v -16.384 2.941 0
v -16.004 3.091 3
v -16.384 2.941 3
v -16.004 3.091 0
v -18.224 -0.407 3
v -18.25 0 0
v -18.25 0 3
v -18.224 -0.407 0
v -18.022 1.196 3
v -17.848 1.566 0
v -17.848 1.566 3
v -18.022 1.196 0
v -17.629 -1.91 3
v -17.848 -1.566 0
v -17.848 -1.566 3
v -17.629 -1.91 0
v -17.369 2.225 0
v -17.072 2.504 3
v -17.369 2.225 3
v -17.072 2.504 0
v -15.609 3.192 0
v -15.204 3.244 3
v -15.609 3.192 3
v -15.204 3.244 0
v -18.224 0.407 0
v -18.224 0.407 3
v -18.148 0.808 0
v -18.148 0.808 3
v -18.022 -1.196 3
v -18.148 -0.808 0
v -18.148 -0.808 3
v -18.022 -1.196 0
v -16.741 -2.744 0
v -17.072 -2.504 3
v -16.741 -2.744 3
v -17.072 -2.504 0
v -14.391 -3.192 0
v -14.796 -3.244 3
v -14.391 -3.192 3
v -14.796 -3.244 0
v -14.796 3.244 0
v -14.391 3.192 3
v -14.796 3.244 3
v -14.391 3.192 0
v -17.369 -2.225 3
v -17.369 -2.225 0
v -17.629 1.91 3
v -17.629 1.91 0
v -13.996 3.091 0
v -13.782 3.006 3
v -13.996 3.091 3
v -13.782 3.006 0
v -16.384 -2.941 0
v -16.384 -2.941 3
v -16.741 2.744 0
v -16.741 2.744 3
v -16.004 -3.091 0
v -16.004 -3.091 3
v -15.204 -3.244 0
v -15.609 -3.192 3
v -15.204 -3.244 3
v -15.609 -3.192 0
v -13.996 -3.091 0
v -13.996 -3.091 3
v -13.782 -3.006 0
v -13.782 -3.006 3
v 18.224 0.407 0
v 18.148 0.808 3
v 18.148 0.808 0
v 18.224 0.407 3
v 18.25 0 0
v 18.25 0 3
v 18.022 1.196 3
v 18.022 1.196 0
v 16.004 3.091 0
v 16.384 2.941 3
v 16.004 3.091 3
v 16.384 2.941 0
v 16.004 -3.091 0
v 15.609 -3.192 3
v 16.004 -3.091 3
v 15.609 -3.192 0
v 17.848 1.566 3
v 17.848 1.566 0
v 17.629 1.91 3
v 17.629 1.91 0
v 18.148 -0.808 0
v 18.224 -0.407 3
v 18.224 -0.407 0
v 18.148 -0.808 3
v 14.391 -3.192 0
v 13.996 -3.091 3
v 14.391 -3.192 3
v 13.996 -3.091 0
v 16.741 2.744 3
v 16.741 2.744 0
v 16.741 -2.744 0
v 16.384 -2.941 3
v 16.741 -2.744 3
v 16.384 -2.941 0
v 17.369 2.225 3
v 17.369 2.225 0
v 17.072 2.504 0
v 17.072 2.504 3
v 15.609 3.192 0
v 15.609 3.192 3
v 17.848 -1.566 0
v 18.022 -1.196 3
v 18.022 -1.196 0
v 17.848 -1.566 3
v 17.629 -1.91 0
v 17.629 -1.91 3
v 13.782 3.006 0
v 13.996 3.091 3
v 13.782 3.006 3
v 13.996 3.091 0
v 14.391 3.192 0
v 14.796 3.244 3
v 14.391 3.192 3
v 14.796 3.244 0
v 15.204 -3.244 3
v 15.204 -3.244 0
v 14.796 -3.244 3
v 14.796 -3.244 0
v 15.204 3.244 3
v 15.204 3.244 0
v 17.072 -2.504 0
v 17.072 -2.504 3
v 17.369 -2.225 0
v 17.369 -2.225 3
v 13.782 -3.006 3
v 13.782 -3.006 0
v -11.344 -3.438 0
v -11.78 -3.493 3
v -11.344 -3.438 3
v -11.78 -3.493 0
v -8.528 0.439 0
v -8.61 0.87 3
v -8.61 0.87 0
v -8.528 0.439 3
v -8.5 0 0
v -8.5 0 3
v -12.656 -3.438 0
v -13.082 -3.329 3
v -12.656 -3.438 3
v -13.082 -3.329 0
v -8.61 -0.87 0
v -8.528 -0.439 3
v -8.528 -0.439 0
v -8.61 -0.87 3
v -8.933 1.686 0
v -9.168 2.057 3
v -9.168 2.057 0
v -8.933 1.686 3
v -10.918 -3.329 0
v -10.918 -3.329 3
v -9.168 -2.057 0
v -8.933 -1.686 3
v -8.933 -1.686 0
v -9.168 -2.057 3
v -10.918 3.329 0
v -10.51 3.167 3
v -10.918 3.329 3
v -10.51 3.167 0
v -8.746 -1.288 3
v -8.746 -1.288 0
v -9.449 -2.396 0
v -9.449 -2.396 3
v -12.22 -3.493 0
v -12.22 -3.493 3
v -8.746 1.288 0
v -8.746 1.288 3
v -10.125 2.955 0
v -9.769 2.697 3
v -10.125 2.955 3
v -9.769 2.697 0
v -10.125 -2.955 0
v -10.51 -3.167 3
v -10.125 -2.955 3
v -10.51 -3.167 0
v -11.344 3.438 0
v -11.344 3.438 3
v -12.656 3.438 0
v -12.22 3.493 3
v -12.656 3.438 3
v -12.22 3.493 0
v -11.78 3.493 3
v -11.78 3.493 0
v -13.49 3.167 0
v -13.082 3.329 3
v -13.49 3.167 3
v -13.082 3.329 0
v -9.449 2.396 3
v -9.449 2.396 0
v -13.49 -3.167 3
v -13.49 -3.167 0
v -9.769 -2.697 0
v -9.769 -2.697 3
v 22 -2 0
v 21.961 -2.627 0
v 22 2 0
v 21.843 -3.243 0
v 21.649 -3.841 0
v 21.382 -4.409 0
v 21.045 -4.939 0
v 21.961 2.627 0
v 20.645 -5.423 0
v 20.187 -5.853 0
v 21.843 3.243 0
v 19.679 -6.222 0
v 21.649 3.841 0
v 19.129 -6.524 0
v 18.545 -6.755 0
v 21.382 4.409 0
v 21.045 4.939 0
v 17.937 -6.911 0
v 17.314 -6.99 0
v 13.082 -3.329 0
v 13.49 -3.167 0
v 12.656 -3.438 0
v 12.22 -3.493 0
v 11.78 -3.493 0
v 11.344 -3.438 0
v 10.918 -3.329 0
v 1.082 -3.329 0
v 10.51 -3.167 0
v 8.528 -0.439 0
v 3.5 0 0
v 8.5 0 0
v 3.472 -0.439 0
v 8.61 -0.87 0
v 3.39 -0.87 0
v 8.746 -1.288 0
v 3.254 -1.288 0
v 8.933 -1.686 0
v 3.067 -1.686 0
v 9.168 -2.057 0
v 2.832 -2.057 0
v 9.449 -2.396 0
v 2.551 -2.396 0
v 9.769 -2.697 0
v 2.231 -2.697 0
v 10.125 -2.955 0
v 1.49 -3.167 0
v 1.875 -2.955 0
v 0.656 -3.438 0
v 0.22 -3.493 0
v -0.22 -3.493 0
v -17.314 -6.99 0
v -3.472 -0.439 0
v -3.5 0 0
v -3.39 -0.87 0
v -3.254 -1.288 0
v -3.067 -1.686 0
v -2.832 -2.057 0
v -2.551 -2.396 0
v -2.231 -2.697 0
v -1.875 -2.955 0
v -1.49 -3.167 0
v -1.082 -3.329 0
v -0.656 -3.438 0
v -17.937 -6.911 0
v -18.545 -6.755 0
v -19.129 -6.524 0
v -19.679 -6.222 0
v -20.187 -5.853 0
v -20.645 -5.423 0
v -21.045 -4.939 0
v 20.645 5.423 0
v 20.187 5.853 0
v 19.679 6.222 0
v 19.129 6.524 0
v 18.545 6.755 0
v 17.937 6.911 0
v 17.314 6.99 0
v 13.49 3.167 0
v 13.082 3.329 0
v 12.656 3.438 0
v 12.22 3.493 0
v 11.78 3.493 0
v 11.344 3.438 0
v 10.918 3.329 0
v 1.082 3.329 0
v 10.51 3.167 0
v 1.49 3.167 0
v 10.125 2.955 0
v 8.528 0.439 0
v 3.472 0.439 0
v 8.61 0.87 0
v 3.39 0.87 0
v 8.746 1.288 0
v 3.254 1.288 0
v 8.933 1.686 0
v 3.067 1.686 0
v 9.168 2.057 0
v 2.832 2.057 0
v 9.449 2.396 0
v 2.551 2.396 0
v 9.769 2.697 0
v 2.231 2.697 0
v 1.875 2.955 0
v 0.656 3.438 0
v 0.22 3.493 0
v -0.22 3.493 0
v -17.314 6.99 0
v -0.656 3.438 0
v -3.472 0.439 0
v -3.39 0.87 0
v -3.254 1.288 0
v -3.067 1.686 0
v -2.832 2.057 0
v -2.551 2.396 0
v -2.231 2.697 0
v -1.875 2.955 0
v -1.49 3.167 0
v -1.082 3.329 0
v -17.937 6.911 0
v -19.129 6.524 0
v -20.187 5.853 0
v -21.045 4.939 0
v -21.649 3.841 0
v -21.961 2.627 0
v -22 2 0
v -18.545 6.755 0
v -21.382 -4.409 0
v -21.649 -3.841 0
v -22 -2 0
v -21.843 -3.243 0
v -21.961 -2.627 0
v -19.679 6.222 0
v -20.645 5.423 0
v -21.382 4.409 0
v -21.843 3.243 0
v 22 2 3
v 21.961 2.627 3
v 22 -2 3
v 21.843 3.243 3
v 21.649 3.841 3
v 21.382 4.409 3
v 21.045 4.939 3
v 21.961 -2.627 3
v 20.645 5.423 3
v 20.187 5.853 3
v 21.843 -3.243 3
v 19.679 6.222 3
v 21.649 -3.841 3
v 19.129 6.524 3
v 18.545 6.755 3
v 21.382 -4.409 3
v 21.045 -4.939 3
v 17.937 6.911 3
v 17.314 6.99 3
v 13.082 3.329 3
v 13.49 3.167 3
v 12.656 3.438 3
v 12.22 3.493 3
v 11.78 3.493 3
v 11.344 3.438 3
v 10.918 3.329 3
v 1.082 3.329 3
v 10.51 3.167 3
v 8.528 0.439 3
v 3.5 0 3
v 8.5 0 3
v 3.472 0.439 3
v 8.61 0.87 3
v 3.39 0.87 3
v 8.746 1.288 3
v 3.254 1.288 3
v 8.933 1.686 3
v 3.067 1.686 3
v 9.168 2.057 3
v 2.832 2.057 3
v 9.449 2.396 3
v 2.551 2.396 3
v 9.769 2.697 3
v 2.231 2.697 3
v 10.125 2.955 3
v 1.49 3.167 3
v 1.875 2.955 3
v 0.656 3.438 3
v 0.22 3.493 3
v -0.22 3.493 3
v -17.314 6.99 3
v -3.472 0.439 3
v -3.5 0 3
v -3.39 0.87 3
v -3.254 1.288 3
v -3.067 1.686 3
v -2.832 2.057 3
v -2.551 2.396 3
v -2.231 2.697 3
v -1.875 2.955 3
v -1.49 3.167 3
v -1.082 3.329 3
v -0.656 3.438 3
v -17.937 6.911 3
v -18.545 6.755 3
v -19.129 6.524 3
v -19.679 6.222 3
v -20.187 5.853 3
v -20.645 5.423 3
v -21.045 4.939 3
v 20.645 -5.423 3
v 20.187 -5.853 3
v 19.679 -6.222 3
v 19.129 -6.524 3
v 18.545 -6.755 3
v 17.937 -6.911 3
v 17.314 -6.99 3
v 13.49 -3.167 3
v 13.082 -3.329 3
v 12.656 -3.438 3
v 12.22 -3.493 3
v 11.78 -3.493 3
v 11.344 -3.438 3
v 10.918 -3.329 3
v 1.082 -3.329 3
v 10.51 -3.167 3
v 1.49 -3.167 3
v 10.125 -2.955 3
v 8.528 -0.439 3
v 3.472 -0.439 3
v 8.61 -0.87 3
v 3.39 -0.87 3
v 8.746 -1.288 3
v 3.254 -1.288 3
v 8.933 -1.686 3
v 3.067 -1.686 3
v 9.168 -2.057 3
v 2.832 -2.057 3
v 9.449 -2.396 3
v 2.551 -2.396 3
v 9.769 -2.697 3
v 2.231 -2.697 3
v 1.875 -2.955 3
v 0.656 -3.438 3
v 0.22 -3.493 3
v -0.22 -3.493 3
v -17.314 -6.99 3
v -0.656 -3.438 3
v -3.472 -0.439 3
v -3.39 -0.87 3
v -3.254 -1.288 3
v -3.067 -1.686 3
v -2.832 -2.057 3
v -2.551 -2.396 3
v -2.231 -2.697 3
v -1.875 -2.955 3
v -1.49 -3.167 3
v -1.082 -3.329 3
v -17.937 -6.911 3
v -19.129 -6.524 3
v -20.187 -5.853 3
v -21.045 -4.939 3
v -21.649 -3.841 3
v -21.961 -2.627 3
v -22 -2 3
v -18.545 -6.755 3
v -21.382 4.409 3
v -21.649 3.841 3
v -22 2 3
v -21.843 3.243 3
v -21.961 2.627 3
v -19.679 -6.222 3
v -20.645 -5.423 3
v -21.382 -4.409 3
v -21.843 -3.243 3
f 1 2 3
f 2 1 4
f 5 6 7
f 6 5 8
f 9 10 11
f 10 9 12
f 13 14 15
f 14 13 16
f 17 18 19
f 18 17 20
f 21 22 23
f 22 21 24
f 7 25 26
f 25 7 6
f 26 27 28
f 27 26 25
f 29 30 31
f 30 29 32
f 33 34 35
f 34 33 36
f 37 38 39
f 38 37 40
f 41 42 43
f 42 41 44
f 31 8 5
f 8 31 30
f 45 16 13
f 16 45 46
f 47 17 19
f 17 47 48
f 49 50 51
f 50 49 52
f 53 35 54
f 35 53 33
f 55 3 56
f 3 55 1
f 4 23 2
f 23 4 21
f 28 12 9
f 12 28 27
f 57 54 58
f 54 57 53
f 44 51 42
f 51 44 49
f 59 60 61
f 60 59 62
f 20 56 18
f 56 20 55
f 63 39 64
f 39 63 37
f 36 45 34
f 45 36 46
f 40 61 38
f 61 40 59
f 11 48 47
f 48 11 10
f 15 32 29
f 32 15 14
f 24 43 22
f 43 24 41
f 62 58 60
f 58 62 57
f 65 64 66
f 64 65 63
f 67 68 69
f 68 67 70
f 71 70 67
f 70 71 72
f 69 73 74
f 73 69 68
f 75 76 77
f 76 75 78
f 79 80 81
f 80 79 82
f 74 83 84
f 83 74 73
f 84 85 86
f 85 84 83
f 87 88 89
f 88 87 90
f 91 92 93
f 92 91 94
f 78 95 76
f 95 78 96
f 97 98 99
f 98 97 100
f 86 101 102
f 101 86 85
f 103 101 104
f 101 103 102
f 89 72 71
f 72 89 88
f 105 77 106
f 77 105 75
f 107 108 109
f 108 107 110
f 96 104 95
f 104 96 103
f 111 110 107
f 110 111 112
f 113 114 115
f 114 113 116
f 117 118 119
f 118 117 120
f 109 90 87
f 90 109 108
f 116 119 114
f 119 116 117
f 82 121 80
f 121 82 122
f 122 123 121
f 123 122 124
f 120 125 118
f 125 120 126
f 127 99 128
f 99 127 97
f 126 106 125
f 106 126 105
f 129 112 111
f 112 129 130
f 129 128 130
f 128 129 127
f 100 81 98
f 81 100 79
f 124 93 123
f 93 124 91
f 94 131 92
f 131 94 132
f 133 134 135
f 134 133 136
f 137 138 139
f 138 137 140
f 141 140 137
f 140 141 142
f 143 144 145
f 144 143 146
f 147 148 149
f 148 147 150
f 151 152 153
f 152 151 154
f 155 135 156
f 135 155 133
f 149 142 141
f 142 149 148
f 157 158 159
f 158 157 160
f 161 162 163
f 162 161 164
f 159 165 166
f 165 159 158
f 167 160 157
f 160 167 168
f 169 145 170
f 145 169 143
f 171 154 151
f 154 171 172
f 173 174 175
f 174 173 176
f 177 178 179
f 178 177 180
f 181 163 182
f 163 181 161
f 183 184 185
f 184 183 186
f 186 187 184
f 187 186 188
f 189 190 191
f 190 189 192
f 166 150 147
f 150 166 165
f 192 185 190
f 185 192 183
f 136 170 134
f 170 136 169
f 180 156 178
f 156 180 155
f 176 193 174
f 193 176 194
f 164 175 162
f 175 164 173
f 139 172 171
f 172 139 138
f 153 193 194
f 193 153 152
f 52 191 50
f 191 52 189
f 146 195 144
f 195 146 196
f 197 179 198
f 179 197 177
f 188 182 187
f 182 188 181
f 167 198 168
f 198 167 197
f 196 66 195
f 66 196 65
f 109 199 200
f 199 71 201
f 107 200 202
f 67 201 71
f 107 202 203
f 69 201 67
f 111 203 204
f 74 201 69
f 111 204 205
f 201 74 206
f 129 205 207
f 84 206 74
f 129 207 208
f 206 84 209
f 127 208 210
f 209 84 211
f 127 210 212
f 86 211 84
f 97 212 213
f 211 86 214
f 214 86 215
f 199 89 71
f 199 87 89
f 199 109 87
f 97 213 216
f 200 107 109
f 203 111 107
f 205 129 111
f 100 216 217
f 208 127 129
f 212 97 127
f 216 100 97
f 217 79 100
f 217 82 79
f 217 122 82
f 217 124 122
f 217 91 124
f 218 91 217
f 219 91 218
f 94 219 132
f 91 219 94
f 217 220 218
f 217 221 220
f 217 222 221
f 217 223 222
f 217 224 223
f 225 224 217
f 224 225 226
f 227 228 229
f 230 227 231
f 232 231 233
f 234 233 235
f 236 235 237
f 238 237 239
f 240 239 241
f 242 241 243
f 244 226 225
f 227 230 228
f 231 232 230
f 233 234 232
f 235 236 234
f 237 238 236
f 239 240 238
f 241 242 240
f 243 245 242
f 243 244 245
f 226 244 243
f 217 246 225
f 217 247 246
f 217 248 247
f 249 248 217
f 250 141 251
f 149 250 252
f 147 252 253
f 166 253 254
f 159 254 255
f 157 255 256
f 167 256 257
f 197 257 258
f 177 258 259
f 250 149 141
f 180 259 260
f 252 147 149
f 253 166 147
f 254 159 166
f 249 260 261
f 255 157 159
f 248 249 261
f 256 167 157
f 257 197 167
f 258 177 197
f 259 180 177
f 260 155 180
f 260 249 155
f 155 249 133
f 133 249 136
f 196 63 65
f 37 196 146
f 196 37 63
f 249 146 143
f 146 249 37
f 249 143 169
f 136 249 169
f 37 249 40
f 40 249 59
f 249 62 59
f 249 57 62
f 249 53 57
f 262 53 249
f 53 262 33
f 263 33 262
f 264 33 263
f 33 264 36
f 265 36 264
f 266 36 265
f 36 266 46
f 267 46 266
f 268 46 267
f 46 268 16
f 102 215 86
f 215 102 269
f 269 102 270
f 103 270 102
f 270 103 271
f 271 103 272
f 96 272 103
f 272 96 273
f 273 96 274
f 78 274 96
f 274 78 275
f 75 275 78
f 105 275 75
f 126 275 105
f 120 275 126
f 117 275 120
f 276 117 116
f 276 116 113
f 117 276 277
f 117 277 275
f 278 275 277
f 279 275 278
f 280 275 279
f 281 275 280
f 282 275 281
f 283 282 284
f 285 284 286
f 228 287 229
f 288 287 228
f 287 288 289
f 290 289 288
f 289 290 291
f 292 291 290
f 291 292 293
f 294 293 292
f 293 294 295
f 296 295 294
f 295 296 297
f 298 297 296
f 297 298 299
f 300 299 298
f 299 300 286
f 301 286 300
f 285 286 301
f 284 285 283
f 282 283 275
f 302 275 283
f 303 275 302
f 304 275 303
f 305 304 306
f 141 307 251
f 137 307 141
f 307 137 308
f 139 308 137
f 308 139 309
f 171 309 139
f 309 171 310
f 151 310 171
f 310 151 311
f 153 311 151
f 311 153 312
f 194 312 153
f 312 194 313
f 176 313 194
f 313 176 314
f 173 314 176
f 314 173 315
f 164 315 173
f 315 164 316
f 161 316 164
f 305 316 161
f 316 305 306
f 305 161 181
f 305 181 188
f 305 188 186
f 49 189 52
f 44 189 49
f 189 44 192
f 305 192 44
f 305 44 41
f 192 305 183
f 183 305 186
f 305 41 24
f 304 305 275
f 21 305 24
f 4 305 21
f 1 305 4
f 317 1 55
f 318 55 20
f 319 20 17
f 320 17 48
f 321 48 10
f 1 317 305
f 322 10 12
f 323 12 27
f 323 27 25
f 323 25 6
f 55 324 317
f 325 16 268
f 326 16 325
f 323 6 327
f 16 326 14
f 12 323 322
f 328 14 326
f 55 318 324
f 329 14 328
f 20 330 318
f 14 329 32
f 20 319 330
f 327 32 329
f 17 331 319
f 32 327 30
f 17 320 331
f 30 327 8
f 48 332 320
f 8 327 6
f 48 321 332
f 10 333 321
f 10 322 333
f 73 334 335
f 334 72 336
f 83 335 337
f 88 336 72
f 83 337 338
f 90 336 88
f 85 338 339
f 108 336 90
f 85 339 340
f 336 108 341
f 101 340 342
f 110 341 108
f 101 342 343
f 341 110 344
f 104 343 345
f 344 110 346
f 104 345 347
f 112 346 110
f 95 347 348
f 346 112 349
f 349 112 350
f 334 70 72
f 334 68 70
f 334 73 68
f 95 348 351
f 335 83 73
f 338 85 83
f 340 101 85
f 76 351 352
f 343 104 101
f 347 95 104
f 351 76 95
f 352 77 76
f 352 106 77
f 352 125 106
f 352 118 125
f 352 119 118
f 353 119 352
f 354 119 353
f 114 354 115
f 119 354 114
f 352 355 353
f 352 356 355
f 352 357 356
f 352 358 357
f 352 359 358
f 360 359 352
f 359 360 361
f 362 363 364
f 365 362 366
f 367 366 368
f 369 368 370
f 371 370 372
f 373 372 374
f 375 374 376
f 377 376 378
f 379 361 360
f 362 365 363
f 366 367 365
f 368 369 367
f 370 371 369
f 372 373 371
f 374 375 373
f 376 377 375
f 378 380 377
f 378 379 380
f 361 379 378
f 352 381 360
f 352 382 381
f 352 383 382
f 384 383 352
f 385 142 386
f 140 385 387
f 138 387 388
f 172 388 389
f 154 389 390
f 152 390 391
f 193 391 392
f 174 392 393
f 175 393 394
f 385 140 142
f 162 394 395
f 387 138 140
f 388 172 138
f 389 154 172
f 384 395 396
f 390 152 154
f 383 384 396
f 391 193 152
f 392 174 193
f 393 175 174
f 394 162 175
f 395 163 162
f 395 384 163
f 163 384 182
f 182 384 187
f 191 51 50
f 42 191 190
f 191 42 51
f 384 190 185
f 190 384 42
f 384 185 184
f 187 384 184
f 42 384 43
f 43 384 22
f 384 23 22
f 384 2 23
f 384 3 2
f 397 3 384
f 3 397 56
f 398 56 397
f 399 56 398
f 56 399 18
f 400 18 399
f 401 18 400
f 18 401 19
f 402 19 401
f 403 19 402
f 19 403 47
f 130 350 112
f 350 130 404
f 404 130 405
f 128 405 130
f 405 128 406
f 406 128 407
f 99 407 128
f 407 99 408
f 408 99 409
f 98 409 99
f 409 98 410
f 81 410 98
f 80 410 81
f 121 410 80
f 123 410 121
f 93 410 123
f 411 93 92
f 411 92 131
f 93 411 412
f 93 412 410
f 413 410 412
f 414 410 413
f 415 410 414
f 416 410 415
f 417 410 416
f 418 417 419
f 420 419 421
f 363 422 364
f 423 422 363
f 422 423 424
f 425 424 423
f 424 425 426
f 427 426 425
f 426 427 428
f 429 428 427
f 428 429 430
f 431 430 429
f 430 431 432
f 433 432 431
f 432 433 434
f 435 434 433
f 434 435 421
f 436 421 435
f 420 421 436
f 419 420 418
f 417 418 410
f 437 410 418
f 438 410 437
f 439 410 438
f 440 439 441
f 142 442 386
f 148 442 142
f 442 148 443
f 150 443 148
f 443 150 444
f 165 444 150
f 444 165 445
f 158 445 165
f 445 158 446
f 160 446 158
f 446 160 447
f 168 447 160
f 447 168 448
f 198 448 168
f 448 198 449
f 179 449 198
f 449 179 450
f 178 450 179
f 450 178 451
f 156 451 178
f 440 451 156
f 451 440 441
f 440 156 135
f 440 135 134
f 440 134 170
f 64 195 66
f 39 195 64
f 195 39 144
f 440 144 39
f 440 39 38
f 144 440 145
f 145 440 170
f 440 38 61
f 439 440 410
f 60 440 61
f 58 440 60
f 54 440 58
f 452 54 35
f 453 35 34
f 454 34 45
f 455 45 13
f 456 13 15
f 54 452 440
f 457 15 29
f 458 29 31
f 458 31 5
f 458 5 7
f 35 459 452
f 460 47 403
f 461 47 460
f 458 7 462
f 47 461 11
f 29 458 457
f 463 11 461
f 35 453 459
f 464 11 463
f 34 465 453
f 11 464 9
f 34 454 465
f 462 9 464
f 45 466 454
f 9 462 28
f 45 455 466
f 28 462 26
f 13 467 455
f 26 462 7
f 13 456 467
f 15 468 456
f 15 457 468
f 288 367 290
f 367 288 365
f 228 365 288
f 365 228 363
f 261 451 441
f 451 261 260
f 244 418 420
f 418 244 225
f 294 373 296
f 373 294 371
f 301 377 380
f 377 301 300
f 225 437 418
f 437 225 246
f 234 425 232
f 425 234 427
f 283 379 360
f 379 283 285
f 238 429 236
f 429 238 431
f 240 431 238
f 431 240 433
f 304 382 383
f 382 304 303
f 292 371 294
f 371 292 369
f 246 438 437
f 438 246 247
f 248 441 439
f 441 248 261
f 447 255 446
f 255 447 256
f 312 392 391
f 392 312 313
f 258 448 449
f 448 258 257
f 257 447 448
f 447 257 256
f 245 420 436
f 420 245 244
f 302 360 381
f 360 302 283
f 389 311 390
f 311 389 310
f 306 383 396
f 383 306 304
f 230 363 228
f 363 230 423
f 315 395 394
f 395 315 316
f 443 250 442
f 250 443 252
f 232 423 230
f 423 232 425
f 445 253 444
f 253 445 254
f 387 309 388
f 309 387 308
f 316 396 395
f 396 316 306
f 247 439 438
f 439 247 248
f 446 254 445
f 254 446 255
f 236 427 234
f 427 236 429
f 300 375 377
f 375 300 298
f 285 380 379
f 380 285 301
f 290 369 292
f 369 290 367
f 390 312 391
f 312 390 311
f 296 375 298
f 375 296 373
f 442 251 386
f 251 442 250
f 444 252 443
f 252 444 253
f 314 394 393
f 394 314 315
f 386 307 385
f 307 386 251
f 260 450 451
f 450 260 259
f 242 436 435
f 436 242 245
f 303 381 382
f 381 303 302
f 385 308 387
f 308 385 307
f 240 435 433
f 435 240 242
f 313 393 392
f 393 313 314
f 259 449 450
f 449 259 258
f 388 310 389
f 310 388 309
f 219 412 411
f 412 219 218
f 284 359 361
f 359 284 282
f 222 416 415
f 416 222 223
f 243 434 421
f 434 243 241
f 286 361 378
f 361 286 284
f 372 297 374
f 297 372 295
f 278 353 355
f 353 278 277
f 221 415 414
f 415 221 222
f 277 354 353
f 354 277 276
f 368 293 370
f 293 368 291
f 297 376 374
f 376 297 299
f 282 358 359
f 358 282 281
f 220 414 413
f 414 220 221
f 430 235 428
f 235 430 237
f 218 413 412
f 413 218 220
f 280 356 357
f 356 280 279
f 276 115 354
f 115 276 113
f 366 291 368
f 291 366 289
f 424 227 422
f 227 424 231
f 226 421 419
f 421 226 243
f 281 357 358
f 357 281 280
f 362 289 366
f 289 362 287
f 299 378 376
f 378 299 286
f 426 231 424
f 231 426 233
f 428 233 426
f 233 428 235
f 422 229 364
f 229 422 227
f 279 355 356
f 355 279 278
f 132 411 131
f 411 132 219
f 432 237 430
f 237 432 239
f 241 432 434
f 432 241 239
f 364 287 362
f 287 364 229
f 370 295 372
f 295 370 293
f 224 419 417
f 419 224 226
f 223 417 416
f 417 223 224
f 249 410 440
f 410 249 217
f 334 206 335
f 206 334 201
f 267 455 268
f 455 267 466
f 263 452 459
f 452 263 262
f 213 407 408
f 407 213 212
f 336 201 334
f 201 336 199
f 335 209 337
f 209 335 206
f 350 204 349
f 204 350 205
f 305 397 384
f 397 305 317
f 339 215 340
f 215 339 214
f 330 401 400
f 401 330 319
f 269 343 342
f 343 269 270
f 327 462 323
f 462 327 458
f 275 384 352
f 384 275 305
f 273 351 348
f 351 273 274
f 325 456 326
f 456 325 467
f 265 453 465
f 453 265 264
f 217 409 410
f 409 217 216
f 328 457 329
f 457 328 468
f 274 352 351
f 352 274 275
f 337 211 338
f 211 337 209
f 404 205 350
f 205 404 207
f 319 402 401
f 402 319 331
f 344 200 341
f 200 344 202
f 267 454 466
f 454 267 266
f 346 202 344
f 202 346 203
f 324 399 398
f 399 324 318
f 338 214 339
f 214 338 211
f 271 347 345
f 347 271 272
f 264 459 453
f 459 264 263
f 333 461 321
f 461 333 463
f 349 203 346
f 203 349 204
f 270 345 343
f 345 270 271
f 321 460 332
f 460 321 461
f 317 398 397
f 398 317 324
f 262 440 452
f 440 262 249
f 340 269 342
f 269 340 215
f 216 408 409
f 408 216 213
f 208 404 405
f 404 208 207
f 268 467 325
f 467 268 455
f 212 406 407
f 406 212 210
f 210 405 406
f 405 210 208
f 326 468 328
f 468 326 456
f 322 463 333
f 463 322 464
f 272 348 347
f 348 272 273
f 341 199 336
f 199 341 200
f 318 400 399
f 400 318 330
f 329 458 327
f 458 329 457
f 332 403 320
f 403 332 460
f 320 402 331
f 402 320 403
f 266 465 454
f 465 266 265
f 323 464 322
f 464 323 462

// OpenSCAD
$fn = 50;


difference() {
	union() {
		hull() {
			translate(v = [-17.0000000000, 2.0000000000, 0]) {
				cylinder(h = 3, r = 5);
			}
			translate(v = [17.0000000000, 2.0000000000, 0]) {
				cylinder(h = 3, r = 5);
			}
			translate(v = [-17.0000000000, -2.0000000000, 0]) {
				cylinder(h = 3, r = 5);
			}
			translate(v = [17.0000000000, -2.0000000000, 0]) {
				cylinder(h = 3, r = 5);
			}
		}
	}
	union() {
		#translate(v = [-15.0000000000, 0.0000000000, -100.0000000000]) {
			cylinder(h = 200, r = 3.2500000000);
		}
		#translate(v = [-15.0000000000, 0.0000000000, -100.0000000000]) {
			cylinder(h = 200, r = 3.2500000000);
		}
		#translate(v = [15.0000000000, 0.0000000000, -100.0000000000]) {
			cylinder(h = 200, r = 3.2500000000);
		}
		#translate(v = [15.0000000000, 0.0000000000, -100.0000000000]) {
			cylinder(h = 200, r = 3.2500000000);
		}
		#translate(v = [-12.0000000000, 0, 0]) {
			cylinder(h = 3, r = 3.5000000000);
		}
		#cylinder(h = 3, r = 3.5000000000);
		#translate(v = [12.0000000000, 0, 0]) {
			cylinder(h = 3, r = 3.5000000000);
		}
	}
}
